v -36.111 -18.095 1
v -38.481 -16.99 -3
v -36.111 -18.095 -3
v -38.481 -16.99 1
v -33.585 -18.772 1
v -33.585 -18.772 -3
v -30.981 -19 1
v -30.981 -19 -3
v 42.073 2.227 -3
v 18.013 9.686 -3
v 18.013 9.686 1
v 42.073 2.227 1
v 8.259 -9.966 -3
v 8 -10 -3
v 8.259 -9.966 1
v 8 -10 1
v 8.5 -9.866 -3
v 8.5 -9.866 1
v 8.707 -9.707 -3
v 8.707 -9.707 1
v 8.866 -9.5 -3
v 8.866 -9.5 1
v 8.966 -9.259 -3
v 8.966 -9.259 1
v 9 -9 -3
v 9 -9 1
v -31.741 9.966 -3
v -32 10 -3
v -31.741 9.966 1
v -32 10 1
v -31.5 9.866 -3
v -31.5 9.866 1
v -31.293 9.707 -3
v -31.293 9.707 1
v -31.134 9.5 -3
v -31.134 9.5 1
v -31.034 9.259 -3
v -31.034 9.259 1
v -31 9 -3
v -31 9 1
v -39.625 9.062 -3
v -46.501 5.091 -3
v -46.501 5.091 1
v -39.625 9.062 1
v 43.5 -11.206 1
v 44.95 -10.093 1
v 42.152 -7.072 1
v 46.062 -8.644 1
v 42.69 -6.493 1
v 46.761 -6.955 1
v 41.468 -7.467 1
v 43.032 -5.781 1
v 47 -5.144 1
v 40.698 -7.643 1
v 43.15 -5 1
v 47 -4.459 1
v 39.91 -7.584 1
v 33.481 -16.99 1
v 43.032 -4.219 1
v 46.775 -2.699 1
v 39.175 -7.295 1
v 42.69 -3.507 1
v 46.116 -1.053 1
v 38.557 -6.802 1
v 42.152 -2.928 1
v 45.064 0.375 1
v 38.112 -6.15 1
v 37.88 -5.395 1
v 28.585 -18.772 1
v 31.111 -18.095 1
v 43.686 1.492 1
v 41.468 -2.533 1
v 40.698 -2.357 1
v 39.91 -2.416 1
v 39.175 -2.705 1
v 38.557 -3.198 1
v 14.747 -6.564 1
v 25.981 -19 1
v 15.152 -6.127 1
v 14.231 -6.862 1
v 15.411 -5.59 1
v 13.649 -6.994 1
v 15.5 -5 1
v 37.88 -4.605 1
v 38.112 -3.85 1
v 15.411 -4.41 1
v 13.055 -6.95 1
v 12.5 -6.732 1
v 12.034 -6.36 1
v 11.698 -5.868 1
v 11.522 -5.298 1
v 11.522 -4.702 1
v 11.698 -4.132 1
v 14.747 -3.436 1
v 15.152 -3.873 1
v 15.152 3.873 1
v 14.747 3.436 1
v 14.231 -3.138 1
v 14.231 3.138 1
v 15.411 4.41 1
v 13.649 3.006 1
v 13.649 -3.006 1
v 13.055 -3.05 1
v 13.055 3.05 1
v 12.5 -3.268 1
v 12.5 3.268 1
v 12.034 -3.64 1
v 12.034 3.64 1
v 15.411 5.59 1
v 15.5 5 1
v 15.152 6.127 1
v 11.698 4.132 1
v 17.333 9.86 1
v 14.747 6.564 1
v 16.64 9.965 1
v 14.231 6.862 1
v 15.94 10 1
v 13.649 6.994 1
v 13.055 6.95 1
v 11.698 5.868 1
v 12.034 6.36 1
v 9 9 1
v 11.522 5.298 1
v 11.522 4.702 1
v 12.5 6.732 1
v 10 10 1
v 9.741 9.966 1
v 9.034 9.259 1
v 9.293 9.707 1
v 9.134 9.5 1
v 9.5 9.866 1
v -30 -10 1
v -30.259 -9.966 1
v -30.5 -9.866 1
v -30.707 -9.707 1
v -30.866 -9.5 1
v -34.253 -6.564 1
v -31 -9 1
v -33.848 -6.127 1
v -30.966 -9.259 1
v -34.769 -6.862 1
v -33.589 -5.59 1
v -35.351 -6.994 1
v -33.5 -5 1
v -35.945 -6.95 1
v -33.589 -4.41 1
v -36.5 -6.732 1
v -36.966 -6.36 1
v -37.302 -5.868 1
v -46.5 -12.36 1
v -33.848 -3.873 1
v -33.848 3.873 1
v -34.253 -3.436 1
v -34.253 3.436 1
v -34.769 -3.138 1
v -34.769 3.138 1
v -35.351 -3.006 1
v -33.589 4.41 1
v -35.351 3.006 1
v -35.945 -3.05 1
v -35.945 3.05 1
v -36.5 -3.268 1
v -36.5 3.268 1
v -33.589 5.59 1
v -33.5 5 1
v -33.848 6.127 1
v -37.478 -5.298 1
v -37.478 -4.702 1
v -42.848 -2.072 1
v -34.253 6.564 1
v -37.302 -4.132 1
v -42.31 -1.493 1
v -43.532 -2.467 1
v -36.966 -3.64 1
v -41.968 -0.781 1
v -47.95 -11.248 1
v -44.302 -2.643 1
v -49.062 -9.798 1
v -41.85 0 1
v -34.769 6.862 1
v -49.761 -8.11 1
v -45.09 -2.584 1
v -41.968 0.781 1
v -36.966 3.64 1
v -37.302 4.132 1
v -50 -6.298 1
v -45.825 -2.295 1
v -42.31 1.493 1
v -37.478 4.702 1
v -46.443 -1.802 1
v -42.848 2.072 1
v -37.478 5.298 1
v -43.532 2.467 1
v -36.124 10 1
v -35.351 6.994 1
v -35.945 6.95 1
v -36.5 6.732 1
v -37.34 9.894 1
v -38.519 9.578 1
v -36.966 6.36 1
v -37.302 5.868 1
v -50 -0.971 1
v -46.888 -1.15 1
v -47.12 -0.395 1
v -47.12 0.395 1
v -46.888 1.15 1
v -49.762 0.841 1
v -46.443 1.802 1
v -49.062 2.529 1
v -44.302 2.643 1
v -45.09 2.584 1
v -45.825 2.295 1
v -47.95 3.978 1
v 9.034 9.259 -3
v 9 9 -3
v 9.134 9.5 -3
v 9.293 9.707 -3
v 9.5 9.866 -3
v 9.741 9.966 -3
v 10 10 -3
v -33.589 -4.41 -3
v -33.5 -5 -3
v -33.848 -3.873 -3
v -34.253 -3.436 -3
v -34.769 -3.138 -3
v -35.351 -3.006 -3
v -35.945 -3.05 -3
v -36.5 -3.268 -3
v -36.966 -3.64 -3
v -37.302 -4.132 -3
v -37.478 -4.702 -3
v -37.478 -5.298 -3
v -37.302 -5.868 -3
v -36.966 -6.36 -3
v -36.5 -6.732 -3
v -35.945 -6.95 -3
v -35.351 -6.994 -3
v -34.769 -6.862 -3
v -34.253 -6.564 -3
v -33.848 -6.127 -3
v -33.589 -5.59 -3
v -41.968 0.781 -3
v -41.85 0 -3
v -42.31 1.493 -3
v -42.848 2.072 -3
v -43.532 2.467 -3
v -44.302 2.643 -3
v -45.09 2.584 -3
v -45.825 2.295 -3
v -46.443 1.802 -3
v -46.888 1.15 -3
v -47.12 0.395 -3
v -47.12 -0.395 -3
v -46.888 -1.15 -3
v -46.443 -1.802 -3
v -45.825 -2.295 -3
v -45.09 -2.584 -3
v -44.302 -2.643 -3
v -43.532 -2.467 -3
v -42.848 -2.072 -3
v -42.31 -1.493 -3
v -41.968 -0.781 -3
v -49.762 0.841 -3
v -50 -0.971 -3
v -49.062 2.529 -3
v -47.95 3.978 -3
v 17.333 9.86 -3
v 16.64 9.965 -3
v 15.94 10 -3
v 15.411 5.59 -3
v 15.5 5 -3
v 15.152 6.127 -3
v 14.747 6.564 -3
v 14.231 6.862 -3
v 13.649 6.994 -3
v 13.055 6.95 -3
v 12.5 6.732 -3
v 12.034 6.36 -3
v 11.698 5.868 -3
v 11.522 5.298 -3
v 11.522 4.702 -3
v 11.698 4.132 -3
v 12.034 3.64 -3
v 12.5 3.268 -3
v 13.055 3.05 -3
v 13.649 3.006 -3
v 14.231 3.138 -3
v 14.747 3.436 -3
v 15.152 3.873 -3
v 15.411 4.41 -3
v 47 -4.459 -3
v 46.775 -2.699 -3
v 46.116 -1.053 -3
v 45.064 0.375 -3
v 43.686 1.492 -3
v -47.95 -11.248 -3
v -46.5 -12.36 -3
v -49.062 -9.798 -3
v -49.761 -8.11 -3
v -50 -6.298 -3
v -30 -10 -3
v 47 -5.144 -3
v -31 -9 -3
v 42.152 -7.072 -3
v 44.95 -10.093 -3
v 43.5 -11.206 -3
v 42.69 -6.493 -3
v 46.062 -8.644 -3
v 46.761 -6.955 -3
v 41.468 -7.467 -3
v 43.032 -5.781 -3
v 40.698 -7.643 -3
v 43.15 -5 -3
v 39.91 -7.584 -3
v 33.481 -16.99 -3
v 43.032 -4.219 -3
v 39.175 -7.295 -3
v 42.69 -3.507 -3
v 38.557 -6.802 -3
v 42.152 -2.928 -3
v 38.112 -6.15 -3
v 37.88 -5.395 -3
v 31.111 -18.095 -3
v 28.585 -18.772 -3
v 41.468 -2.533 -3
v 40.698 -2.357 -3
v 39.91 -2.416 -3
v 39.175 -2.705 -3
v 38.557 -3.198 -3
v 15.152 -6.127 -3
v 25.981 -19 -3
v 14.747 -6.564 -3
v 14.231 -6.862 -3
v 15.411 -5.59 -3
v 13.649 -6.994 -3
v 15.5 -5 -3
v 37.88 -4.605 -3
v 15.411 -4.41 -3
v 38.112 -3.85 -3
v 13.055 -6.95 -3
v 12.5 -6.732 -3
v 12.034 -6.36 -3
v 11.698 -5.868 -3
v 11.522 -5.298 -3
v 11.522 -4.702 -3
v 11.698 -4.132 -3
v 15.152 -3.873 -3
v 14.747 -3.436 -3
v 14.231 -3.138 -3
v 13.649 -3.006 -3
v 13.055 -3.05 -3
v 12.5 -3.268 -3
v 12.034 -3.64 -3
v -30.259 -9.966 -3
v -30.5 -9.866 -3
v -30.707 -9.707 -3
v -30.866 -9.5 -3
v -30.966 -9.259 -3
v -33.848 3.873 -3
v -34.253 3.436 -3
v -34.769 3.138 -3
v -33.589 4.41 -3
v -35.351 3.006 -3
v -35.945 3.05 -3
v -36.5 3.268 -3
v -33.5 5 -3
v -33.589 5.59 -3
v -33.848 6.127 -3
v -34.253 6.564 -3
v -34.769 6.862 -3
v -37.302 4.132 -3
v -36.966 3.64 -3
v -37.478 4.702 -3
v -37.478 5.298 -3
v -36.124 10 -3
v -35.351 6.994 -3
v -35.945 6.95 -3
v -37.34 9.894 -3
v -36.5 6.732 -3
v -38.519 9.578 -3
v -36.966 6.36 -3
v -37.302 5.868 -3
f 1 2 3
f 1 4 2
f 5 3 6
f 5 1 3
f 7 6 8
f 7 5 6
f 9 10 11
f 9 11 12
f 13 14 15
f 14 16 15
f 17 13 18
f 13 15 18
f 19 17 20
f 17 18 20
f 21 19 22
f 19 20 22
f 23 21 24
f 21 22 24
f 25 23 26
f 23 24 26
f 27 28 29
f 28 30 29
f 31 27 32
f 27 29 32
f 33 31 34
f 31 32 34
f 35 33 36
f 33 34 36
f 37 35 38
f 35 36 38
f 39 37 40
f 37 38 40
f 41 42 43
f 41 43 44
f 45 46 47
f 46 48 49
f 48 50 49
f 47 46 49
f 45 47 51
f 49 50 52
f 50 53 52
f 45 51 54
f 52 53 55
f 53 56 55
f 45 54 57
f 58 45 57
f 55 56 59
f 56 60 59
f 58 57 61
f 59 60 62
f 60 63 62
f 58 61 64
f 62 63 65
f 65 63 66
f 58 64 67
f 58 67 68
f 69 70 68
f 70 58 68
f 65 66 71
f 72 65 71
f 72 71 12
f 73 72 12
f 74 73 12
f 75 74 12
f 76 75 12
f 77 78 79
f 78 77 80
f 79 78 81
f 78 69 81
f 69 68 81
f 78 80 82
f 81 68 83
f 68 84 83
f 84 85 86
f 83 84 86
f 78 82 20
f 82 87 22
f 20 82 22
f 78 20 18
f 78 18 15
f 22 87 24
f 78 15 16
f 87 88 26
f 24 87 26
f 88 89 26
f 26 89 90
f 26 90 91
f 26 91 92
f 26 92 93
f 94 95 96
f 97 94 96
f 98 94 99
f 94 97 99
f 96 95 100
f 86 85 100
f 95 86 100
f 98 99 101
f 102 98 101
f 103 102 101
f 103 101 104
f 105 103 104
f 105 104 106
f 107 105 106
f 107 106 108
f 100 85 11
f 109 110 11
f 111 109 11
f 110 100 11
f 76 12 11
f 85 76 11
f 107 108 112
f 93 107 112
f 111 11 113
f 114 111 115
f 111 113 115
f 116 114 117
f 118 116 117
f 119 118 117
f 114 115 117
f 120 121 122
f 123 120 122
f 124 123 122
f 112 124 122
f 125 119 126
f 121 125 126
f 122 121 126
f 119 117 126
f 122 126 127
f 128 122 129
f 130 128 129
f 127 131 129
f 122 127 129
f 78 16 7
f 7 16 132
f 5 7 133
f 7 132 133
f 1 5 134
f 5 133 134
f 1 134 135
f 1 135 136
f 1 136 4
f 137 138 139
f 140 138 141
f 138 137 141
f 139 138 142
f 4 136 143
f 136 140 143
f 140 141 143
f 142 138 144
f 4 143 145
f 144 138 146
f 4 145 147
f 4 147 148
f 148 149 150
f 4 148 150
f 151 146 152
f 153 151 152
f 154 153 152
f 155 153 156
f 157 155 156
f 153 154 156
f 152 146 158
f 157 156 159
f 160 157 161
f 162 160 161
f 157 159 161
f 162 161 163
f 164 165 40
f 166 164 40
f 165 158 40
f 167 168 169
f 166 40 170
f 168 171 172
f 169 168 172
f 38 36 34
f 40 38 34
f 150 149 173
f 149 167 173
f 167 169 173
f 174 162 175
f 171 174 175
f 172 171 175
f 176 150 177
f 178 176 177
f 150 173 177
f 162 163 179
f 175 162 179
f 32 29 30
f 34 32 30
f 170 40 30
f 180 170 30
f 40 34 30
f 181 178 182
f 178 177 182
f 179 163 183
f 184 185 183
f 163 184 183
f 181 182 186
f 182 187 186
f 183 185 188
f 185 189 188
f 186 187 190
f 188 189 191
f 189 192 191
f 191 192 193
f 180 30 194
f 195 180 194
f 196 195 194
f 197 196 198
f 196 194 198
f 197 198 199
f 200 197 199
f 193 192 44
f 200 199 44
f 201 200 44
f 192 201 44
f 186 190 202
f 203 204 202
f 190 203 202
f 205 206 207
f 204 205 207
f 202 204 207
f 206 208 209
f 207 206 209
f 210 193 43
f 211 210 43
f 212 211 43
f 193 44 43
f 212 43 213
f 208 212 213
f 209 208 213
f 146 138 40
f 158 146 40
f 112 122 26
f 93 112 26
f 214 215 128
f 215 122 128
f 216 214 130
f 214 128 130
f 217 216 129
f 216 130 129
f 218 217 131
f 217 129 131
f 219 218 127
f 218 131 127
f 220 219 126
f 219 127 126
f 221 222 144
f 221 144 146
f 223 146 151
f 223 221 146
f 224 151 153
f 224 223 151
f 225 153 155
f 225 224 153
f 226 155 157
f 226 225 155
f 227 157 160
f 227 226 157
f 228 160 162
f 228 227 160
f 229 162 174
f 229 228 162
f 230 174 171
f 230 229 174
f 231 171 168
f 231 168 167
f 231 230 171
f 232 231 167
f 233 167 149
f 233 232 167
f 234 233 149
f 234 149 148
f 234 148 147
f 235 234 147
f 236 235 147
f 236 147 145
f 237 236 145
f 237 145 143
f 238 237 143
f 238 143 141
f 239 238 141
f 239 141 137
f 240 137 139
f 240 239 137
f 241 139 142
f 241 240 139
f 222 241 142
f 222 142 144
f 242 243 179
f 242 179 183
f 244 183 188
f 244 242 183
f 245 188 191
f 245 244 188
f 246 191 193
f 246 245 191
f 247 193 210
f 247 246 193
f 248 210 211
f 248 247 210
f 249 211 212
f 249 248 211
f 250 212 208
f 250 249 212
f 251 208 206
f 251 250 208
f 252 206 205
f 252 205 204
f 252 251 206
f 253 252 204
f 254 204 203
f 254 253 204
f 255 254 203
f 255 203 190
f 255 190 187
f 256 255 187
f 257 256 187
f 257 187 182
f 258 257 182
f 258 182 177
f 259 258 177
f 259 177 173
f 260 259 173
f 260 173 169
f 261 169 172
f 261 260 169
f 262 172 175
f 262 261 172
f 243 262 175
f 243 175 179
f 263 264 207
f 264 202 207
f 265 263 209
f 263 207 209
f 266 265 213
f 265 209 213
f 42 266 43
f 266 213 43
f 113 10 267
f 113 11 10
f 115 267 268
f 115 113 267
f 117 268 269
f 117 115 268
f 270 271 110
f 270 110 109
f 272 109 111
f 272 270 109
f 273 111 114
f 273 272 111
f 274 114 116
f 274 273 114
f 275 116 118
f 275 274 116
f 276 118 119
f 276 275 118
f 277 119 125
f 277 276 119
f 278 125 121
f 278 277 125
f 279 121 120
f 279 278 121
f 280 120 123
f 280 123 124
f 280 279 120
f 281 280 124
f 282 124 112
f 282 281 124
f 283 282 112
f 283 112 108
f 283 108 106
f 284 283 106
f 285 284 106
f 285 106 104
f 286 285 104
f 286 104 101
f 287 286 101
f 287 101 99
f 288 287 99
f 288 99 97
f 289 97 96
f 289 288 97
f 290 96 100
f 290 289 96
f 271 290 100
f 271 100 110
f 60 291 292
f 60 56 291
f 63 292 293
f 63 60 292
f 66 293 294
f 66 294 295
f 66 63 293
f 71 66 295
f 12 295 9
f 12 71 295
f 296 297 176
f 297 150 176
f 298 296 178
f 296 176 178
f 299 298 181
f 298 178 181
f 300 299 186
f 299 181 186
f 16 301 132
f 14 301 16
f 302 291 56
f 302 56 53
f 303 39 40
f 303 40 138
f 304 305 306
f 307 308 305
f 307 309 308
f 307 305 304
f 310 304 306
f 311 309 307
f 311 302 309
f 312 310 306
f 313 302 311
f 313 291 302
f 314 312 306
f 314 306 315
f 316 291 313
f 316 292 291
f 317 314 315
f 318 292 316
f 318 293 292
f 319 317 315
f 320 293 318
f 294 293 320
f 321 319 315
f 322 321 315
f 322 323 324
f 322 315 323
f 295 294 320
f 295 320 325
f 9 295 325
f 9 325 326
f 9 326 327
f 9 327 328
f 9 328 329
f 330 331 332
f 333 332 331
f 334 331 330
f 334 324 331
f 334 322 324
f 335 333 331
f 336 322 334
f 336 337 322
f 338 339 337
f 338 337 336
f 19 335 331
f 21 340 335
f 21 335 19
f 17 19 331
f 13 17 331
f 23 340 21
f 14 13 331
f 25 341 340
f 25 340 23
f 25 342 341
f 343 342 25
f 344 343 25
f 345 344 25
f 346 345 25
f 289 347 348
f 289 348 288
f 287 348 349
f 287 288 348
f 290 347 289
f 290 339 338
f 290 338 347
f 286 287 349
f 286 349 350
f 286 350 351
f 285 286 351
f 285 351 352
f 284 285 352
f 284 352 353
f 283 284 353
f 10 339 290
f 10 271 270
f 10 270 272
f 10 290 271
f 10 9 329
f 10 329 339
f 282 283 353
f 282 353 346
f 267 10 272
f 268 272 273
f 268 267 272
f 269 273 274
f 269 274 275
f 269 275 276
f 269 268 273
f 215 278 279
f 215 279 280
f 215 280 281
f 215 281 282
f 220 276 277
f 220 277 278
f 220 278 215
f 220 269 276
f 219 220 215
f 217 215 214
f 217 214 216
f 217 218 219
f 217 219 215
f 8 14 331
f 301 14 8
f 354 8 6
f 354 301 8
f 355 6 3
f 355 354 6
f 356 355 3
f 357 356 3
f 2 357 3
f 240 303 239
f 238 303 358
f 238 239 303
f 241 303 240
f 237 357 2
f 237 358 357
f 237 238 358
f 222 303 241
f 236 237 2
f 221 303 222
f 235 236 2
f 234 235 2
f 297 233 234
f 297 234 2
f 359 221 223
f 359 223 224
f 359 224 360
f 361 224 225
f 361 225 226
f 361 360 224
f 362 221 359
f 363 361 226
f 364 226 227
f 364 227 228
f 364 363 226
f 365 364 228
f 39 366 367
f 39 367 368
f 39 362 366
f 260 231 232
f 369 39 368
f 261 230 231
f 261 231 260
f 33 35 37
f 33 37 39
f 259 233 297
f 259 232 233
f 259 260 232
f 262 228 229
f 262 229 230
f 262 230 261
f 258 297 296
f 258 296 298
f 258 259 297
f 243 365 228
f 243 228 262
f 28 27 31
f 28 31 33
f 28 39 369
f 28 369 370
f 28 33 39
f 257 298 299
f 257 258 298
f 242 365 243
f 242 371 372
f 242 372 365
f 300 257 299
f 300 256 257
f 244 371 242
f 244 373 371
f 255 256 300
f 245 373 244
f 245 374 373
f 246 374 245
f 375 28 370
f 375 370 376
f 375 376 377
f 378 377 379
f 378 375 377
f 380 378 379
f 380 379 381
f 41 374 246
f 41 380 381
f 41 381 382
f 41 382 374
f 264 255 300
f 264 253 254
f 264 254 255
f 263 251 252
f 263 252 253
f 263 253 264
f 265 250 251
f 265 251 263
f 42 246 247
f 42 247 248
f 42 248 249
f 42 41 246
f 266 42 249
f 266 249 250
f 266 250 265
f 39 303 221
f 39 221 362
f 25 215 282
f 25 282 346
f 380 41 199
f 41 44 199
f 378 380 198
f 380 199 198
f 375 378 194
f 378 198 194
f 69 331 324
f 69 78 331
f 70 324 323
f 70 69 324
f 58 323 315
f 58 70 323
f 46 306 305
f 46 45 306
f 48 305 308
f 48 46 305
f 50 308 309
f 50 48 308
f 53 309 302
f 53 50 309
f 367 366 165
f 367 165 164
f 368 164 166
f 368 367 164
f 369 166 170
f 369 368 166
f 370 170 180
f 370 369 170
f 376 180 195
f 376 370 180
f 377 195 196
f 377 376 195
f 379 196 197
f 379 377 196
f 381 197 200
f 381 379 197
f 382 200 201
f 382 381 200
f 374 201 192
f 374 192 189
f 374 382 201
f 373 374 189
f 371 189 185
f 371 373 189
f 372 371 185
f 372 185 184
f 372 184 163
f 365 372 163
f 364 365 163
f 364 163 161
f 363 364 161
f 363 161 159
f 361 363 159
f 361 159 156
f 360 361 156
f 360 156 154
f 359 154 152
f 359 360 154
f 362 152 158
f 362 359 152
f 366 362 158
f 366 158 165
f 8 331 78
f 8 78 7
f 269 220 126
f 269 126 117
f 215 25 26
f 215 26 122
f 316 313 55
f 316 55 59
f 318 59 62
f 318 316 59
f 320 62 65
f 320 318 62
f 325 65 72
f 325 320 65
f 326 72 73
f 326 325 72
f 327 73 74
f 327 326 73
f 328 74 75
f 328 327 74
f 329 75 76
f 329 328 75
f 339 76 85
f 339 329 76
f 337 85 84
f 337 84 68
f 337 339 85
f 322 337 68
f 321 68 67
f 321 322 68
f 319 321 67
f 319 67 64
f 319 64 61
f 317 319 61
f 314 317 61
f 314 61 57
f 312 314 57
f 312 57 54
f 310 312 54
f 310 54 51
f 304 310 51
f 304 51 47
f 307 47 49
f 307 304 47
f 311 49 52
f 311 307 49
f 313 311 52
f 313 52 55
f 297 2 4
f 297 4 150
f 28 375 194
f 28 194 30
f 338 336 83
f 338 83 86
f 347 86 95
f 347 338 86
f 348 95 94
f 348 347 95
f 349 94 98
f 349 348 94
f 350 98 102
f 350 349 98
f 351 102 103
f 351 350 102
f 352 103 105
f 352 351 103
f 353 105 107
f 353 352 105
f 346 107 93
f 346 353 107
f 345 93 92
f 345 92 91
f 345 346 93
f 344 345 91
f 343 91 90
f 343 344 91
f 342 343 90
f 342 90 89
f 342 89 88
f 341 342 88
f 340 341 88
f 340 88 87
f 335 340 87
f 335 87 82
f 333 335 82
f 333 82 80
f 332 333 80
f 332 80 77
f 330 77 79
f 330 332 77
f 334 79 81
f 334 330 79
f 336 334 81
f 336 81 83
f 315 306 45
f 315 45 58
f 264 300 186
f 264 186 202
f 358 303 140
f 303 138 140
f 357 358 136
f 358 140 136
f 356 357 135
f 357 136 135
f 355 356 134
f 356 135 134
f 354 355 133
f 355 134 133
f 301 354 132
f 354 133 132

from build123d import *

# Parameters (mm, degrees)
SKETCH005_R   = 2
SKETCH005_R_2 = 2.65
PAD_DEPTH     = 4
FILLET_R      = 15
FILLET001_R   = 7
FILLET002_R   = 7
FILLET003_R   = 1


with BuildPart() as part:
    # Sketch005 → Pad (new body)
    with BuildSketch(Plane.XY.offset(-3)):
        Polygon((-38, 10), (-31, 10), (-31, -10), (9, -10), (9, 10), (17, 10), (47, 0.7), (47, -9.185045), (30, -19), (-35, -19), (-50, -10.339746), (-50, 3.07), align=None)
        with Locations((-35.5, 5)):
            Circle(SKETCH005_R, mode=Mode.SUBTRACT)
        with Locations((-35.5, -5)):
            Circle(SKETCH005_R, mode=Mode.SUBTRACT)
        with Locations((13.5, 5)):
            Circle(SKETCH005_R, mode=Mode.SUBTRACT)
        with Locations((13.5, -5)):
            Circle(SKETCH005_R, mode=Mode.SUBTRACT)
        with Locations((-44.5, 0)):
            Circle(SKETCH005_R_2, mode=Mode.SUBTRACT)
        with Locations((40.5, -5)):
            Circle(SKETCH005_R_2, mode=Mode.SUBTRACT)
    extrude(amount=PAD_DEPTH)

    # Fillet
    fillet_edges = [part.edges().sort_by_distance(p)[0] for p in [
        (30, -19, -1),
        (-35, -19, -1),
    ]]
    fillet(fillet_edges, radius=FILLET_R)

    # Fillet001
    fillet001_edges = [part.edges().sort_by_distance(p)[0] for p in [
        (-50, -10.339746, -1),
        (47, -9.185045, -1),
    ]]
    fillet(fillet001_edges, radius=FILLET001_R)

    # Fillet002
    fillet002_edges = [part.edges().sort_by_distance(p)[0] for p in [
        (-50, 3.07, -1),
        (-38, 10, -1),
        (17, 10, -1),
        (47, 0.7, -1),
    ]]
    fillet(fillet002_edges, radius=FILLET002_R)

    # Fillet003
    fillet003_edges = [part.edges().sort_by_distance(p)[0] for p in [
        (-31, 10, -1),
        (9, 10, -1),
        (9, -10, -1),
        (-31, -10, -1),
    ]]
    fillet(fillet003_edges, radius=FILLET003_R)


solid = part.part
